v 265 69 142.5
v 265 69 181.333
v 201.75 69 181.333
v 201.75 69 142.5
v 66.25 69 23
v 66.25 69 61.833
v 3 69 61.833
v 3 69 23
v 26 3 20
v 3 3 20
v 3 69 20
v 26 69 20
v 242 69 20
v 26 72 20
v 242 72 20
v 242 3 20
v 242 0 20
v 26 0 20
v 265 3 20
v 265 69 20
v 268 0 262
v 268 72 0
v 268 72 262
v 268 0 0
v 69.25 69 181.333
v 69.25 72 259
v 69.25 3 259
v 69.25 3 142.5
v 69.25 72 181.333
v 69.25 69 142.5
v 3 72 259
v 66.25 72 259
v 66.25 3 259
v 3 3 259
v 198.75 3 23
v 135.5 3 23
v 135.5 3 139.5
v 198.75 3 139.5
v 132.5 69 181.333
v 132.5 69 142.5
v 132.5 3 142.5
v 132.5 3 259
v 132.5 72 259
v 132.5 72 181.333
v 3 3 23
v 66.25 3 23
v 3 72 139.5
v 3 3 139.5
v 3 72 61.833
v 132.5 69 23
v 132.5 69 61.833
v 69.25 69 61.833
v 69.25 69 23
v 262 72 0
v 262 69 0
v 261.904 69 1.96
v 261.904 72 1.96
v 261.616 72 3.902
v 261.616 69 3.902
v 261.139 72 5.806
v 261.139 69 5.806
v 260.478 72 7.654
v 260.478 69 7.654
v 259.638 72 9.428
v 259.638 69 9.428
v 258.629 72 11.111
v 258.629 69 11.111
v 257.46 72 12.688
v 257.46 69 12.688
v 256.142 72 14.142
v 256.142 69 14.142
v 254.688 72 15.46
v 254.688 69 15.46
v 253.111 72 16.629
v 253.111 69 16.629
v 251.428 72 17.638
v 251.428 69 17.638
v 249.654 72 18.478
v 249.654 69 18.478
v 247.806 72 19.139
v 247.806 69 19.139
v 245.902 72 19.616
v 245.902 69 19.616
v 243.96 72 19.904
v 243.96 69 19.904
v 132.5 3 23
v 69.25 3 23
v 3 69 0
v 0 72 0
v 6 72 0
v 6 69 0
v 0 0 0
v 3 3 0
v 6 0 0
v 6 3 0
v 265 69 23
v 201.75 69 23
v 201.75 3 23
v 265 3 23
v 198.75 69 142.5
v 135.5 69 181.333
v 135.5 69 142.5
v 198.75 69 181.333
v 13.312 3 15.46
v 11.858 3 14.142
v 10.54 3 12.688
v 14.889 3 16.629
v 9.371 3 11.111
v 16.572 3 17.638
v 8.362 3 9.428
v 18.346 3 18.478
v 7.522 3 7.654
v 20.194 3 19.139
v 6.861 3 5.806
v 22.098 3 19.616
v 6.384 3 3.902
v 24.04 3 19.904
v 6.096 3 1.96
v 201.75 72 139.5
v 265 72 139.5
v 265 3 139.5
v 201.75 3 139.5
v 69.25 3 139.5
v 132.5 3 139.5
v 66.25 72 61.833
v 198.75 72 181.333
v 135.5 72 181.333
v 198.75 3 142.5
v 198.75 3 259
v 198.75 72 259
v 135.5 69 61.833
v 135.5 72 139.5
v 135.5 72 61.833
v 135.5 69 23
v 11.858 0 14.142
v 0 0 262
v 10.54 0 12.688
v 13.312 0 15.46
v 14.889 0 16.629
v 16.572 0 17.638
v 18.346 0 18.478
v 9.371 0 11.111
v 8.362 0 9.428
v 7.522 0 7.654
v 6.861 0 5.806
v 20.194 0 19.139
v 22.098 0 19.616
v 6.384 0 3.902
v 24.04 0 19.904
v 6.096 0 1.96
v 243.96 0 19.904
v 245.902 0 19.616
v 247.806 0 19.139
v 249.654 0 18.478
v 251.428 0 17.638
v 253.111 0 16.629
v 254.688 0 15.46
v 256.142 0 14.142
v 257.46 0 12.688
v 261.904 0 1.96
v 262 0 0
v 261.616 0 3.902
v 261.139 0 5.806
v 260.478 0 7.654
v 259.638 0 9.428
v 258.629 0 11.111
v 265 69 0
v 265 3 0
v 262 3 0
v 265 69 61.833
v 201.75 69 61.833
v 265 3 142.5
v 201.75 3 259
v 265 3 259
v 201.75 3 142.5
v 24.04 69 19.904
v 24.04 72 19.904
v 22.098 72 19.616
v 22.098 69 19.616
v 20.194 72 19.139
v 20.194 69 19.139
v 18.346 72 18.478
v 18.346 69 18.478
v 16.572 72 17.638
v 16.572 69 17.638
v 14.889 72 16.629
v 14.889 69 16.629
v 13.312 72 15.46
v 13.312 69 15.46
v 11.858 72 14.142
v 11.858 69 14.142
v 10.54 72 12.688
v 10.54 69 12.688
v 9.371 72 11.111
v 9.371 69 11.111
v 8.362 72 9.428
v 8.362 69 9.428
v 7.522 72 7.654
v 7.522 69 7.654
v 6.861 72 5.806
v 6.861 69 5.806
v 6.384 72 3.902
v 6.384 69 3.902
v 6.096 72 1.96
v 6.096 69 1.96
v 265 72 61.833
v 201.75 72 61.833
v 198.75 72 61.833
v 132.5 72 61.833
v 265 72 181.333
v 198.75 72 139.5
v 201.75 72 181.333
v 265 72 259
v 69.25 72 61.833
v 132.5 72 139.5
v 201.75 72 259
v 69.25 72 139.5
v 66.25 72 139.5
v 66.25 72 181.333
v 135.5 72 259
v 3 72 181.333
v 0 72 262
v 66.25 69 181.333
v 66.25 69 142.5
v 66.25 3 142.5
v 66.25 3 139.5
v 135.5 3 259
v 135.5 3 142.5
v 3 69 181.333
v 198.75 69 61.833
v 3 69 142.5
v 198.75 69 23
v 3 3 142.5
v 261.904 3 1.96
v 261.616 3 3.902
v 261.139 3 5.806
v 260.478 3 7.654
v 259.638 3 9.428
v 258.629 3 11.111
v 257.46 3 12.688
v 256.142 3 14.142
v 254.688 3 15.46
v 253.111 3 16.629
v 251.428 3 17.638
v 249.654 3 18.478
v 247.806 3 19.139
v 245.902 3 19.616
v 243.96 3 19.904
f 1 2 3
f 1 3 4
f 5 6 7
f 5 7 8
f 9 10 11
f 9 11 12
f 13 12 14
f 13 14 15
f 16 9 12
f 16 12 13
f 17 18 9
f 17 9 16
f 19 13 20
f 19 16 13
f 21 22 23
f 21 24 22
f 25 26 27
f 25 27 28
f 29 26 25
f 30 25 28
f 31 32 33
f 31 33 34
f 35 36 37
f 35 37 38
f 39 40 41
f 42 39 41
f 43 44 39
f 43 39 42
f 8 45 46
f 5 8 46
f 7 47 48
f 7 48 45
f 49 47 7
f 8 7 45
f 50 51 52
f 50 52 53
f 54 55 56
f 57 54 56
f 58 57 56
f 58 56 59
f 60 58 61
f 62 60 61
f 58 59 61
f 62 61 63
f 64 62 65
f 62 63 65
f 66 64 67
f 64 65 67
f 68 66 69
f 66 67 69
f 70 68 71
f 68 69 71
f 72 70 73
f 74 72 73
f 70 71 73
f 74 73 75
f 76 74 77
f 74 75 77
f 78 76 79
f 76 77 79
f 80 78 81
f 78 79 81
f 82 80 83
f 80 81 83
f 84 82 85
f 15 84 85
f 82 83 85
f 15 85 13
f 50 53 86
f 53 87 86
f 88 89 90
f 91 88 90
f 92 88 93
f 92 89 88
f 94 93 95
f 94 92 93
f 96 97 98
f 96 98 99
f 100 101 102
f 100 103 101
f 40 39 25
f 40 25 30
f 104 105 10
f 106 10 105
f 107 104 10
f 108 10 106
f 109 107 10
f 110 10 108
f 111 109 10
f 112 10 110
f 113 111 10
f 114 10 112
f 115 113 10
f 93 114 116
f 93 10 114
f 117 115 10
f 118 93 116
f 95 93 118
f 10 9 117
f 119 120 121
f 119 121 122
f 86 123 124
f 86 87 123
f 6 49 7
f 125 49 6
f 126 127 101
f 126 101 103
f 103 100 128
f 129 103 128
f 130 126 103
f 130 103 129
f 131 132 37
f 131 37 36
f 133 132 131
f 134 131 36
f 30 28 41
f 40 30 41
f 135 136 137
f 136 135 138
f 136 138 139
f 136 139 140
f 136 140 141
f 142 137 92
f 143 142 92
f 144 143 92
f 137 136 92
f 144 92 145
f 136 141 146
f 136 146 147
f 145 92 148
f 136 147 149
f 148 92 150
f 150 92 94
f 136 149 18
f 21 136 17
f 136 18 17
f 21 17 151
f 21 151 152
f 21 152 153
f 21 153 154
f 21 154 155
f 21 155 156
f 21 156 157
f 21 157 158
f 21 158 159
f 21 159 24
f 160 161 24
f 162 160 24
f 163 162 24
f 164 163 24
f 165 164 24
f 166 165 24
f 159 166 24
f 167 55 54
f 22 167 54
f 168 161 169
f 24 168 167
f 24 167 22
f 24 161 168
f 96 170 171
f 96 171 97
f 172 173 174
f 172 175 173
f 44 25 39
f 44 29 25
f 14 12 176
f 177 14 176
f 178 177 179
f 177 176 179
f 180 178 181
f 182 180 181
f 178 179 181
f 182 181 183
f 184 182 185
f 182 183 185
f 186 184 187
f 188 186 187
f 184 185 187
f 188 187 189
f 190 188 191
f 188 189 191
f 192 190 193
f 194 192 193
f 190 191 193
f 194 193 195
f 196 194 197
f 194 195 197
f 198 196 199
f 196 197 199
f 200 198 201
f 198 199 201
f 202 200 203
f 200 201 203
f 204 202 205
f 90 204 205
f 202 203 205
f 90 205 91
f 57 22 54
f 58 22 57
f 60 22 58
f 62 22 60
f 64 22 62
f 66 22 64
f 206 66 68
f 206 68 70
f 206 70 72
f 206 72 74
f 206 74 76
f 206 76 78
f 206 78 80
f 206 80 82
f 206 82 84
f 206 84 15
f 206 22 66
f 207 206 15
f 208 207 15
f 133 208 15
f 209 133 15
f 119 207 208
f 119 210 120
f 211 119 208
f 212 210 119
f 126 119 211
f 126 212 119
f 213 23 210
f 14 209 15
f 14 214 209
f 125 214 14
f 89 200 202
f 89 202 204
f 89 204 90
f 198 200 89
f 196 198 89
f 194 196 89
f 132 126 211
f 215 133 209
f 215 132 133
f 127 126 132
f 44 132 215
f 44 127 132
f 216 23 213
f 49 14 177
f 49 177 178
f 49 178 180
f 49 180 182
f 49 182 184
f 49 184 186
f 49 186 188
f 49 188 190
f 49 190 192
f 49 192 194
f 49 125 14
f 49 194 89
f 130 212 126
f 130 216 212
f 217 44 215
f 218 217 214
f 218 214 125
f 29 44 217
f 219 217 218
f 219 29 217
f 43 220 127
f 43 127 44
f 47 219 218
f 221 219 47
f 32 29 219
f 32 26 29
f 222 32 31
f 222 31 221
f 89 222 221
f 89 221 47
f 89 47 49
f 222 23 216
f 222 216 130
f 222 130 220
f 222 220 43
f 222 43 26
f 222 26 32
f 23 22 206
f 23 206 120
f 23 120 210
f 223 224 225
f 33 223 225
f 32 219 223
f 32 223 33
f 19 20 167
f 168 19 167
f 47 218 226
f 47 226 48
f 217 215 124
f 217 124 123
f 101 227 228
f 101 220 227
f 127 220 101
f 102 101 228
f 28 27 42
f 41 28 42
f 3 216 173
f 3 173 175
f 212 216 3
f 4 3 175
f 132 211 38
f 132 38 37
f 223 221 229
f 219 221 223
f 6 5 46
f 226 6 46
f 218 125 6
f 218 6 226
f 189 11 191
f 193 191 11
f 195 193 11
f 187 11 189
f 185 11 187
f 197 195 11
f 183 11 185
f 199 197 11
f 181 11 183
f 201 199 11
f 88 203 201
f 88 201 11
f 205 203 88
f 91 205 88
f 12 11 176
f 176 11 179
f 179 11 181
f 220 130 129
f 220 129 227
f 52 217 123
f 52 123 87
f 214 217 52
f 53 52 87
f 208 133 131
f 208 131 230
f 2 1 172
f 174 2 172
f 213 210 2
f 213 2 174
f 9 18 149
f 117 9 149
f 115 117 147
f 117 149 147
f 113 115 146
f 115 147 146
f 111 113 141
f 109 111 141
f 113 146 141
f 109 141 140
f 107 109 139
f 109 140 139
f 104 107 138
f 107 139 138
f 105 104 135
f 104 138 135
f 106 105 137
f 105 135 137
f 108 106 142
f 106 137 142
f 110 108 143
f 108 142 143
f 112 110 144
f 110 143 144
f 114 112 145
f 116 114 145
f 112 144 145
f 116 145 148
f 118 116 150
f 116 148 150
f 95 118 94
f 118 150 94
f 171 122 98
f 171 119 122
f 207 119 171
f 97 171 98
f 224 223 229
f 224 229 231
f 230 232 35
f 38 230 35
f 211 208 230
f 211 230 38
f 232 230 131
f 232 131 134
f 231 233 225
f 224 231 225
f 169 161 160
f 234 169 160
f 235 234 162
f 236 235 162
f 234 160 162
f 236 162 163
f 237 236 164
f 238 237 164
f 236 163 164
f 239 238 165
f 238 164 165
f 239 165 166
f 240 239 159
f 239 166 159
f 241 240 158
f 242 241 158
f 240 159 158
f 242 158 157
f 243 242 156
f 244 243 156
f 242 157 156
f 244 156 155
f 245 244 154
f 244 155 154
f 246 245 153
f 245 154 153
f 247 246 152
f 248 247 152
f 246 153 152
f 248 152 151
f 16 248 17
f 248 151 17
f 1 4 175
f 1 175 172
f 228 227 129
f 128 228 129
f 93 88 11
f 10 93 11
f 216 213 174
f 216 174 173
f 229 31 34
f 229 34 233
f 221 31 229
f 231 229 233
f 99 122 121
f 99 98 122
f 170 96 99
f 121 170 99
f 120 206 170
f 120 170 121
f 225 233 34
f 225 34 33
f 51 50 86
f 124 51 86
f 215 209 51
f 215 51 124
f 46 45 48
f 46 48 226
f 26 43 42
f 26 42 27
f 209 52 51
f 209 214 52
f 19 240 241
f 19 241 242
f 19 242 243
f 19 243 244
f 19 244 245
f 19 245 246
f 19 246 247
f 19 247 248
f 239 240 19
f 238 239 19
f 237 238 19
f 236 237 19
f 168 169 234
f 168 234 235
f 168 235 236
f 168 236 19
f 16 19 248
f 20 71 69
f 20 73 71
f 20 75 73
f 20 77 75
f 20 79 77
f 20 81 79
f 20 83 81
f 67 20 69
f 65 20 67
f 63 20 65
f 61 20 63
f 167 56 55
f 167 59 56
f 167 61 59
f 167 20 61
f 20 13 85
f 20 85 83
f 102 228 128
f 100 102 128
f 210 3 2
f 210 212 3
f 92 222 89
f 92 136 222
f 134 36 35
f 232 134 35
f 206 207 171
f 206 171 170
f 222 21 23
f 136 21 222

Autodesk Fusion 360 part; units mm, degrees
sketch "Sorted Smarties Collector" plane through (0, 0, 0) normal (0, 1, 0) x (1, 0, 0)
  line L0 (0, 0) -> (268, 0)
  line L1 (268, 0) -> (268, -262)
  line L2 (268, -262) -> (0, -262)
  line L3 (0, -262) -> (0, 0)
  dimension "d1" = 268
  dimension "d41" = 262
extrude "Extrude1" add sketch "Sorted Smarties Collector" along normal blind 3
sketch "Smartie Collectors" plane through (0, 3, 0) normal (0, 1, 0) x (-1, 0, 0)
  line L0 (0, 262) -> (-268, 262)
  line L1 (-268, 262) -> (-268, 0)
  line L2 (-268, 0) -> (0, 0)
  line L3 (0, 0) -> (0, 262)
  line L4 (-265, 259) -> (-201.75, 259)
  line L5 (-201.75, 259) -> (-201.75, 142.5)
  line L6 (-201.75, 142.5) -> (-265, 142.5)
  line L7 (-265, 142.5) -> (-265, 259)
  line L8 (-198.75, 259) -> (-135.5, 259)
  line L9 (-135.5, 259) -> (-135.5, 142.5)
  line L10 (-135.5, 142.5) -> (-198.75, 142.5)
  line L11 (-198.75, 142.5) -> (-198.75, 259)
  line L12 (-132.5, 259) -> (-69.25, 259)
  line L13 (-69.25, 259) -> (-69.25, 142.5)
  line L14 (-69.25, 142.5) -> (-132.5, 142.5)
  line L15 (-132.5, 142.5) -> (-132.5, 259)
  line L16 (-66.25, 259) -> (-3, 259)
  line L17 (-3, 259) -> (-3, 142.5)
  line L18 (-3, 142.5) -> (-66.25, 142.5)
  line L19 (-66.25, 142.5) -> (-66.25, 259)
  line L20 (-265, 139.5) -> (-201.75, 139.5)
  line L21 (-201.75, 139.5) -> (-201.75, 23)
  line L22 (-201.75, 23) -> (-265, 23)
  line L23 (-265, 23) -> (-265, 139.5)
  line L24 (-198.75, 139.5) -> (-135.5, 139.5)
  line L25 (-135.5, 139.5) -> (-135.5, 23)
  line L26 (-135.5, 23) -> (-198.75, 23)
  line L27 (-198.75, 23) -> (-198.75, 139.5)
  line L28 (-132.5, 139.5) -> (-69.25, 139.5)
  line L29 (-69.25, 139.5) -> (-69.25, 23)
  line L30 (-69.25, 23) -> (-132.5, 23)
  line L31 (-132.5, 23) -> (-132.5, 139.5)
  line L32 (-66.25, 139.5) -> (-3, 139.5)
  line L33 (-3, 139.5) -> (-3, 23)
  line L34 (-3, 23) -> (-66.25, 23)
  line L35 (-66.25, 23) -> (-66.25, 139.5)
  line L36 (-265, 0) -> (-3, 0)
  line L37 (-3, 0) -> (-3, 20)
  line L38 (-3, 20) -> (-265, 20)
  line L39 (-265, 20) -> (-265, 0)
  dimension "d51" = 3
  dimension "d52" = 3
  dimension "d53" = 3
  dimension "d54" = 20
  dimension "d55" = 3
  dimension "d56" = 3
  dimension "d57" = 3
  dimension "d58" = 3
  dimension "d59" = 3
  dimension "d60" = 116.5
  dimension "d61" = 116.5
  dimension "d62" = 63.25
  dimension "d63" = 63.25
  dimension "d64" = 63.25
  dimension "d65" = 63.25
extrude "Extrude2" add sketch "Smartie Collectors" along normal blind 69 contours L0 L1 L2 L3 L37 L38 L39
sketch "Front Panel" plane through (268, 0, 0) normal (1, 0, 0) x (0, 1, 0)
  line L0 (0, 262) -> (0, 0)
  line L1 (0, 0) -> (72, 0)
  line L2 (72, 0) -> (72, 262)
  line L3 (72, 262) -> (0, 262)
  line L4 (72, 262) -> (69, 262)
  line L5 (69, 262) -> (69, 0)
  line L6 (69, 0) -> (72, 0)
  line L7 (72, 0) -> (72, 262)
  dimension "d66" = 3
extrude "Extrude3" add sketch "Front Panel" against normal blind 268 contours L1 L2 L3 L4 L5 L6 L7
sketch "Front Openings" plane through (0, 72, 0) normal (0, 1, 0) x (-1, 0, 0)
  line L0 (-268, 0) -> (0, 0)
  line L1 (0, 0) -> (0, 262)
  line L2 (0, 262) -> (-268, 262)
  line L3 (-268, 262) -> (-268, 0)
  line L4 (0, 262) -> (-268, 262)
  line L5 (-198.75, 259) -> (-135.5, 259)
  line L6 (-265, 259) -> (-201.75, 259)
  line L7 (-201.75, 142.5) -> (-265, 142.5)
  line L8 (-265, 139.5) -> (-201.75, 139.5)
  line L9 (-201.75, 23) -> (-265, 23)
  line L10 (-135.5, 23) -> (-198.75, 23)
  line L11 (-69.25, 23) -> (-132.5, 23)
  line L12 (-3, 23) -> (-66.25, 23)
  line L13 (-132.5, 139.5) -> (-69.25, 139.5)
  line L14 (-198.75, 139.5) -> (-135.5, 139.5)
  line L15 (-135.5, 142.5) -> (-198.75, 142.5)
  line L16 (-69.25, 142.5) -> (-132.5, 142.5)
  line L17 (-3, 142.5) -> (-66.25, 142.5)
  line L18 (-66.25, 139.5) -> (-3, 139.5)
  line L19 (-132.5, 259) -> (-69.25, 259)
  line L20 (-66.25, 259) -> (-3, 259)
  line L21 (-3, 20) -> (-265, 20)
  line L22 (-3, 0) -> (-3, 20)
  line L23 (-265, 20) -> (-265, 0)
  line L24 (-265, 23) -> (-265, 139.5)
  line L25 (-201.75, 139.5) -> (-201.75, 23)
  line L26 (-198.75, 23) -> (-198.75, 139.5)
  line L27 (-135.5, 139.5) -> (-135.5, 23)
  line L28 (-132.5, 23) -> (-132.5, 139.5)
  line L29 (-69.25, 139.5) -> (-69.25, 23)
  line L30 (-66.25, 23) -> (-66.25, 139.5)
  line L31 (-3, 139.5) -> (-3, 23)
  line L32 (-265, 142.5) -> (-265, 259)
  line L33 (-201.75, 259) -> (-201.75, 142.5)
  line L34 (-198.75, 142.5) -> (-198.75, 259)
  line L35 (-135.5, 259) -> (-135.5, 142.5)
  line L36 (-132.5, 142.5) -> (-132.5, 259)
  line L37 (-69.25, 259) -> (-69.25, 142.5)
  line L38 (-66.25, 142.5) -> (-66.25, 259)
  line L39 (-3, 259) -> (-3, 142.5)
  line L40 (-265, 259) -> (-201.75, 259)
  line L41 (-201.75, 259) -> (-201.75, 181.3333)
  line L42 (-201.75, 181.3333) -> (-265, 181.3333)
  line L43 (-265, 181.3333) -> (-265, 259)
  line L44 (-198.75, 259) -> (-135.5, 259)
  line L45 (-135.5, 259) -> (-135.5, 181.3333)
  line L46 (-135.5, 181.3333) -> (-198.75, 181.3333)
  line L47 (-198.75, 181.3333) -> (-198.75, 259)
  line L48 (-132.5, 259) -> (-69.25, 259)
  line L49 (-69.25, 259) -> (-69.25, 181.3333)
  line L50 (-69.25, 181.3333) -> (-132.5, 181.3333)
  line L51 (-132.5, 181.3333) -> (-132.5, 259)
  line L52 (-66.25, 259) -> (-3, 259)
  line L53 (-3, 259) -> (-3, 181.3333)
  line L54 (-3, 181.3333) -> (-66.25, 181.3333)
  line L55 (-66.25, 181.3333) -> (-66.25, 259)
  line L56 (-265, 139.5) -> (-201.75, 139.5)
  line L57 (-201.75, 139.5) -> (-201.75, 61.8333)
  line L58 (-201.75, 61.8333) -> (-265, 61.8333)
  line L59 (-265, 61.8333) -> (-265, 139.5)
  line L60 (-198.75, 139.5) -> (-135.5, 139.5)
  line L61 (-135.5, 139.5) -> (-135.5, 61.8333)
  line L62 (-135.5, 61.8333) -> (-198.75, 61.8333)
  line L63 (-198.75, 61.8333) -> (-198.75, 139.5)
  line L64 (-132.5, 139.5) -> (-69.25, 139.5)
  line L65 (-69.25, 139.5) -> (-69.25, 61.8333)
  line L66 (-69.25, 61.8333) -> (-132.5, 61.8333)
  line L67 (-132.5, 61.8333) -> (-132.5, 139.5)
  line L68 (-66.25, 139.5) -> (-3, 139.5)
  line L69 (-3, 139.5) -> (-3, 61.8333)
  line L70 (-3, 61.8333) -> (-66.25, 61.8333)
  line L71 (-66.25, 61.8333) -> (-66.25, 139.5)
  line L72 (-3, 20) -> (-3, 0)
  line L73 (-3, 0) -> (-265, 0)
  line L74 (-265, 0) -> (-265, 20)
  dimension "d72" = 77.6667
  dimension "d73" = 77.6667
extrude "Extrude4" cut sketch "Front Openings" against normal blind 3 contours L5 L34 L35 L44 L45 L46 L47 | L6 L32 L33 L40 L41 L42 L43 | L8 L24 L25 L56 L57 L58 L59 | L14 L26 L27 L60 L61 L62 L63 | L13 L28 L29 L64 L65 L66 L67 | L18 L30 L31 L68 L69 L70 L71 | L19 L36 L37 L48 L49 L50 L51 | L20 L38 L39 L52 L53 L54 L55
sketch "Slide Handle" plane through (0, 0, 0) normal (0, -1, 0) x (1, 0, 0)
  line L0 (0, 262) -> (0, 0)
  line L1 (0, 0) -> (268, 0)
  line L2 (268, 0) -> (268, 262)
  line L3 (3, 20) -> (265, 20)
  line L4 (3, 0) -> (3, 20)
  line L5 (265, 20) -> (265, 0)
  line L6 (265, 0) -> (3, 0)
  line L7 (268, 262) -> (268, 0)
  line L8 (0, 0) -> (0, 262)
  line L9 (0, 262) -> (268, 262)
  line L10 (268, 0) -> (0, 0)
  line L11 (26, 0) -> (242, 0)
  line L12 (242, 0) -> (242, 20)
  line L13 (242, 20) -> (26, 20)
  line L14 (26, 20) -> (26, 0)
  circle A0 centre (26, 0) radius 20
  circle A1 centre (242, 0) radius 20
  point P0 (268, 0)
  dimension "d77" = 20
  dimension "d78" = 40
  dimension "d79" = 40
  dimension "d80" = 26
  dimension "d81" = 26
extrude "Extrude5" cut sketch "Slide Handle" against normal blind 72 contours L1 L6 L10 L14 A0 | L1 L6 L10 L11 L14 A0 | L1 L3 L6 L10 L11 L13 A0 A1 | L1 L6 L10 L12 A1 | L1 L6 L10 L11 L12 A1
equation "d1 = width"
equation "polycarbonateThickness = 3 mm" comment "Thickness of the polycarbonate panels"
equation "d3 = polycarbonateThickness"
equation "collectorWidth = ( width - 5 * polycarbonateThickness ) / 4" comment "Width of a Smartie collector"
equation "d37 = collectorLength - polycarbonateThickness"
equation "collectorHeight = ( height - 3 * polycarbonateThickness - bottomHeight ) / 2" comment "Height of a Smartie Collector"
equation "height = 264 mm - tolerance" comment "Height of the Sorted Smarties Collector"
equation "d41 = height"
equation "bottomHeight = 20 mm" comment "Heigh of the botom part of the Sorted Smarties Collector"
equation "d51 = polycarbonateThickness"
equation "d52 = polycarbonateThickness"
equation "d53 = polycarbonateThickness"
equation "d54 = bottomHeight"
equation "d55 = polycarbonateThickness"
equation "d56 = polycarbonateThickness"
equation "d57 = polycarbonateThickness"
equation "d58 = polycarbonateThickness"
equation "d59 = polycarbonateThickness"
equation "d60 = collectorHeight"
equation "d62 = collectorWidth"
equation "d63 = collectorWidth"
equation "d64 = collectorWidth"
equation "d66 = polycarbonateThickness"
equation "d67 = -width"
equation "d69 = -polycarbonateThickness"
equation "openingHeight = collectorHeight * 2 / 3" comment "Height of the open part at the front of the Smartie collectors"
equation "d72 = openingHeight"
equation "d73 = openingHeight"
equation "d74 = -collectorLength"
equation "collectorLength = 72 mm" comment "Depth of the Sorted Smarties Collector Component"
equation "d80 = 2 * polycarbonateThickness + 20 mm"
equation "d81 = 2 * polycarbonateThickness + 20 mm"
equation "tolerance = 2 mm" comment "Tolerance to allow for easy motion"
equation "width = 270 mm - tolerance" comment "Width of the Sorted Smarties Component"
